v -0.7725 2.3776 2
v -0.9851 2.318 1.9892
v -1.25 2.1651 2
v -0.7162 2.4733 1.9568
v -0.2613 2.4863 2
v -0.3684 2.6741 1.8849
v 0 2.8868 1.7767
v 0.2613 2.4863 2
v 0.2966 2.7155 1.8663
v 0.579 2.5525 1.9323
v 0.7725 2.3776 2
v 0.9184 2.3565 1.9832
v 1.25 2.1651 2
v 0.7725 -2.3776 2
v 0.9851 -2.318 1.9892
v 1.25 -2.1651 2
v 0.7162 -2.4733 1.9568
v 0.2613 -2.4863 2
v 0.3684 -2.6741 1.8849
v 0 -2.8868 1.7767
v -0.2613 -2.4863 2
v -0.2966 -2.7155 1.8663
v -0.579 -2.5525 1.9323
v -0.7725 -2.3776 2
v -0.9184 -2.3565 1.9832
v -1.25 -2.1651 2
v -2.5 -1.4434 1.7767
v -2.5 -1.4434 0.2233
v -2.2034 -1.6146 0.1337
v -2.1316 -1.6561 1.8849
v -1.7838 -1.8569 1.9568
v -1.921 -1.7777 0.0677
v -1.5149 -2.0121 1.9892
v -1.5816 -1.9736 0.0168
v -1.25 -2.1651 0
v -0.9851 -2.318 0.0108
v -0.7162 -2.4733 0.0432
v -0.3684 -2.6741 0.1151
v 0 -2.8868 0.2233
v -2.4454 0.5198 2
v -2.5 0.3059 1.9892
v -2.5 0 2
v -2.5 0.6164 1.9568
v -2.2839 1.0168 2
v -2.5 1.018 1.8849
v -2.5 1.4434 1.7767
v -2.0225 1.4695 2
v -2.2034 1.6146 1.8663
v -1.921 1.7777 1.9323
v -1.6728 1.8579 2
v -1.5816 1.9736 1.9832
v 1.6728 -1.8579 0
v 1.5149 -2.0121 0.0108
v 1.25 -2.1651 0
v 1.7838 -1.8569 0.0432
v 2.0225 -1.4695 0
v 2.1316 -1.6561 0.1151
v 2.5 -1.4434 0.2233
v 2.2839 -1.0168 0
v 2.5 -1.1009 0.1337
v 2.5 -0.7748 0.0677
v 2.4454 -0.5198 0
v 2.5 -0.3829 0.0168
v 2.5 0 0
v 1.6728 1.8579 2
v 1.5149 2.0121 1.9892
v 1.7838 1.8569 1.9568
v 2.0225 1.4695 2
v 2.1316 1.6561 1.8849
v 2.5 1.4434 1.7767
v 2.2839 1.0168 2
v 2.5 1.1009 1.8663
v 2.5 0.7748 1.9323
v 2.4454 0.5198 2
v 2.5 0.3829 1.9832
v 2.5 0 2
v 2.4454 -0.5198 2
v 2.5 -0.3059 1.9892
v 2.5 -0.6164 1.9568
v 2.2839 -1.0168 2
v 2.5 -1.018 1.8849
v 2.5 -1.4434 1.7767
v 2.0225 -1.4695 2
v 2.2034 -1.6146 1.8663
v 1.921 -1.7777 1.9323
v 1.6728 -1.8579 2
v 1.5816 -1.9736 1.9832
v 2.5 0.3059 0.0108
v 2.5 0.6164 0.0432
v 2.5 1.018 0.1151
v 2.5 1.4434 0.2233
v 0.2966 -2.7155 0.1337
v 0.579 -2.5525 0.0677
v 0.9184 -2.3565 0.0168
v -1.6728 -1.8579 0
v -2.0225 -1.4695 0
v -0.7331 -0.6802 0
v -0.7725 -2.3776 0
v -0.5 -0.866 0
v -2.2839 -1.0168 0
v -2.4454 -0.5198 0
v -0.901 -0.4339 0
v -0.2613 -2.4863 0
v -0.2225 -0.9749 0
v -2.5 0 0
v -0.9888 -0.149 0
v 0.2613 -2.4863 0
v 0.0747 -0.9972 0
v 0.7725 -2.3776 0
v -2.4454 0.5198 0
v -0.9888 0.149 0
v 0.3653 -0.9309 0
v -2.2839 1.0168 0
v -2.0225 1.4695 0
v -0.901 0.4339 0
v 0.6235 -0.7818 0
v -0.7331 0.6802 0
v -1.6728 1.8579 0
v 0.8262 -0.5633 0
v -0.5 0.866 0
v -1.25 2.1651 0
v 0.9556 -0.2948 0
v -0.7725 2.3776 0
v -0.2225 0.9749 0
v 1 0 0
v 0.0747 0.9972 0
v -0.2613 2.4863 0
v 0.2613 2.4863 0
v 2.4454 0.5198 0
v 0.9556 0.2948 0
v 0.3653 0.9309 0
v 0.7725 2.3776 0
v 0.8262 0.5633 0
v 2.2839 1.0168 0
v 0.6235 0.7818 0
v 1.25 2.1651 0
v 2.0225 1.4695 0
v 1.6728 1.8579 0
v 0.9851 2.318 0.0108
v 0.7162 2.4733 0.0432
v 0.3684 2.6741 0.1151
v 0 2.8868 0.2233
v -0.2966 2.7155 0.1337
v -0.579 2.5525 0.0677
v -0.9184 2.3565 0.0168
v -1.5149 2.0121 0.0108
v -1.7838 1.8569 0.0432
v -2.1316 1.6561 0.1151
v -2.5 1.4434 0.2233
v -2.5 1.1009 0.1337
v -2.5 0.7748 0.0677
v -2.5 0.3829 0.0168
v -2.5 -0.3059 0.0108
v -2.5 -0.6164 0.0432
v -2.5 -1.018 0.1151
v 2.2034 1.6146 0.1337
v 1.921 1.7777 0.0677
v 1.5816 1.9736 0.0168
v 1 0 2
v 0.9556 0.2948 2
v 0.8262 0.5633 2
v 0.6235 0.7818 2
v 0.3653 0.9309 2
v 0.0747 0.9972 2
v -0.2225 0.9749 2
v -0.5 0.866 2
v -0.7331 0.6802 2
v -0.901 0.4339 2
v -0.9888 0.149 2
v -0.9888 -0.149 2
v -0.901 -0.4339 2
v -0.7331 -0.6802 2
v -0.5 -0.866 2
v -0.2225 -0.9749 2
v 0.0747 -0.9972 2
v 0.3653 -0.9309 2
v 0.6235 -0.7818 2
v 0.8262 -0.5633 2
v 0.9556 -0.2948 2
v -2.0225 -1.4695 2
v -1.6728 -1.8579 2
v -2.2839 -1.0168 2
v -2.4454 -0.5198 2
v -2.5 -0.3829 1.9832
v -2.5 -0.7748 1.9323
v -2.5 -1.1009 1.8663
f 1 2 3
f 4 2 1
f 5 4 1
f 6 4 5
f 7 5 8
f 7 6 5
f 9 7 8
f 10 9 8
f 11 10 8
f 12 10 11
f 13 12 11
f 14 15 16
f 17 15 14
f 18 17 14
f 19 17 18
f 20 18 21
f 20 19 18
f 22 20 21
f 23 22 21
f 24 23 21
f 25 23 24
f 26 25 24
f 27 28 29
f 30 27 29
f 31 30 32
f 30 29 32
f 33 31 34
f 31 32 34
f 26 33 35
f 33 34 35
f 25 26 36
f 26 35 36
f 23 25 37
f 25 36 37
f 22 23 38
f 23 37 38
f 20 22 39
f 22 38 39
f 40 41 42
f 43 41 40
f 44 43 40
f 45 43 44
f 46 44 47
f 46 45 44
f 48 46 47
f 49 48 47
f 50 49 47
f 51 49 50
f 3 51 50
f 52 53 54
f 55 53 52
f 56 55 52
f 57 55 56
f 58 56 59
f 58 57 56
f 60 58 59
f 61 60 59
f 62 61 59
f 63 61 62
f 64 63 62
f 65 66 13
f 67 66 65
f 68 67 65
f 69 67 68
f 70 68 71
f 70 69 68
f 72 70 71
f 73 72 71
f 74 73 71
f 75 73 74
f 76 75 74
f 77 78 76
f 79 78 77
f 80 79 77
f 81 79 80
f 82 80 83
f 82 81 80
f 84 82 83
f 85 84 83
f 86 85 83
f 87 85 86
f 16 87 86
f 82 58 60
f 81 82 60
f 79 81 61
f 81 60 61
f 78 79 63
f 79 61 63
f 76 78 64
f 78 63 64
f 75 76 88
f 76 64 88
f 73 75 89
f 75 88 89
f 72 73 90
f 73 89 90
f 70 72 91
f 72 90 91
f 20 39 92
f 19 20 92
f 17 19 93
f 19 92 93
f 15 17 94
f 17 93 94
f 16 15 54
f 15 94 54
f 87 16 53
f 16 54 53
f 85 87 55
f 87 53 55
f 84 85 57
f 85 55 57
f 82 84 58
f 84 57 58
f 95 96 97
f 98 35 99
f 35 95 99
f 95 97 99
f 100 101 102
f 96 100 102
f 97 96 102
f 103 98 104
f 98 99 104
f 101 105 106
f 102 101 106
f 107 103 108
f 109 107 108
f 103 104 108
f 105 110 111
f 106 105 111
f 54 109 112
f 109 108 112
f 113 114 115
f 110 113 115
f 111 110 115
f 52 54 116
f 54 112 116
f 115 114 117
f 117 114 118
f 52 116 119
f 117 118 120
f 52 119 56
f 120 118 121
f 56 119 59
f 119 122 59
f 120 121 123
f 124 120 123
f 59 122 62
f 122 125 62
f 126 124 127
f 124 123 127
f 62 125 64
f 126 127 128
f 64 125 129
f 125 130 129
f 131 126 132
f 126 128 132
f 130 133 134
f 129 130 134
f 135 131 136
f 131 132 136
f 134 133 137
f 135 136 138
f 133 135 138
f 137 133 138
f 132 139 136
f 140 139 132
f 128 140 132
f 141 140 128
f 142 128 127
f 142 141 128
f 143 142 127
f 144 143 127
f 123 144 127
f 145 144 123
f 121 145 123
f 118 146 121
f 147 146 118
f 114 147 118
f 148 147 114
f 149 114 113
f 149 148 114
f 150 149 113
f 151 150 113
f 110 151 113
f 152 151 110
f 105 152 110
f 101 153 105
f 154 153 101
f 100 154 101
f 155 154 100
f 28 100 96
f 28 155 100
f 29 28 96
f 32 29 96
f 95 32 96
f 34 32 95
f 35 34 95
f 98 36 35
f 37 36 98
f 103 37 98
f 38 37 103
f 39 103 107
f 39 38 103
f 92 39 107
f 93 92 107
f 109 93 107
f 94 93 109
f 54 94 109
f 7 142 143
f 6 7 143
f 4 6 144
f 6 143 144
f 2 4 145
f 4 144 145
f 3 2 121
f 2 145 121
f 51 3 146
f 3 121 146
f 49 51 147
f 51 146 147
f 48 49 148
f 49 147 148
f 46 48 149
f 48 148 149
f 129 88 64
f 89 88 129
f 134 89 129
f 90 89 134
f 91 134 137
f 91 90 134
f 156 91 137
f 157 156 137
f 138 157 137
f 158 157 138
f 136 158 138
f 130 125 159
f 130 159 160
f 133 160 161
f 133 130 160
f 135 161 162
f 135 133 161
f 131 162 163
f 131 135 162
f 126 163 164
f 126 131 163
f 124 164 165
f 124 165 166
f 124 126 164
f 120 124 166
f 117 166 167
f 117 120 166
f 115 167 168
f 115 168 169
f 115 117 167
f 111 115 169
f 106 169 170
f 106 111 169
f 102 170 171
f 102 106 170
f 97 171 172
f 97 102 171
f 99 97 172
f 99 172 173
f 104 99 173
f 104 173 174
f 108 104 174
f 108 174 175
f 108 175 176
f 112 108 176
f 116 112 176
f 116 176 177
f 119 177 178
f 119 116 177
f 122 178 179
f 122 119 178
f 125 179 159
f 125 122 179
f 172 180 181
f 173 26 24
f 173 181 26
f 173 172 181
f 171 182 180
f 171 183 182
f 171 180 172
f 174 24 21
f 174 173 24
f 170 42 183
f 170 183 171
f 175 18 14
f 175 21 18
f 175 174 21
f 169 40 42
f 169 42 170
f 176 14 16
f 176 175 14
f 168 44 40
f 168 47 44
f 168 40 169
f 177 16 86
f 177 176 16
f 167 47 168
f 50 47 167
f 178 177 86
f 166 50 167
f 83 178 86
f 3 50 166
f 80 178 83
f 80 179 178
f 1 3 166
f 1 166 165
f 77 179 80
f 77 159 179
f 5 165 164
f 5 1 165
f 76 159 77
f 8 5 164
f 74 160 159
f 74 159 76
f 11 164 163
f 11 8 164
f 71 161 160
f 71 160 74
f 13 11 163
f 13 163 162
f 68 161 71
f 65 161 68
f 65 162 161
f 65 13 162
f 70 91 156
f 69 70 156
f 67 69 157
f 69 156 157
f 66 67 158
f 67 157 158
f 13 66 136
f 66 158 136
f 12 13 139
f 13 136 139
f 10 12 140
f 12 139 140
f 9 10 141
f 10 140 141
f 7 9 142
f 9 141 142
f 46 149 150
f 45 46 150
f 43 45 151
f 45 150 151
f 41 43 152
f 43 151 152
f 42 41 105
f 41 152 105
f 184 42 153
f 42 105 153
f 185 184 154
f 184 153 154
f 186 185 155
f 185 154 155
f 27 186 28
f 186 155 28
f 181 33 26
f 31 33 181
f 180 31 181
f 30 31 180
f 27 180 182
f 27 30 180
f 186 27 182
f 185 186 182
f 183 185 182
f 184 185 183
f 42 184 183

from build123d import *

# Parameters (mm, degrees)
SKETCH1_R           = 1
BOSS_EXTRUDE1_DEPTH = 2
SKETCH2_OUTSIDE_W   = 15.508
SKETCH2_OUTSIDE_H   = 16.282
SKETCH2_OUTSIDE_R   = 2.5
CUT_EXTRUDE1_DEPTH  = 2
CUT_EXTRUDE1_TAPER  = 60
SKETCH3_OUTSIDE_W   = 15.508
SKETCH3_OUTSIDE_H   = 16.282
SKETCH3_OUTSIDE_R   = 2.5
CUT_EXTRUDE2_DEPTH  = 2
CUT_EXTRUDE2_TAPER  = 60


with BuildPart() as part:
    # Sketch1 → Boss-Extrude1 (new body)
    with BuildSketch(Plane.XY):
        Polygon((0, -2.886751346), (2.5, -1.443375673), (2.5, 1.443375673), (0, 2.886751346), (-2.5, 1.443375673), (-2.5, -1.443375673), align=None)
        Circle(SKETCH1_R, mode=Mode.SUBTRACT)
    extrude(amount=BOSS_EXTRUDE1_DEPTH)

    # Sketch2 outside → Cut-Extrude1 (cut)
    with BuildSketch(Plane.XY.offset(2)):
        Rectangle(SKETCH2_OUTSIDE_W, SKETCH2_OUTSIDE_H)
        Circle(SKETCH2_OUTSIDE_R, mode=Mode.SUBTRACT)
    extrude(amount=-CUT_EXTRUDE1_DEPTH, taper=CUT_EXTRUDE1_TAPER, mode=Mode.SUBTRACT)

    # Sketch3 outside → Cut-Extrude2 (cut)
    with BuildSketch(Plane(origin=(0, 0, 0), x_dir=(-1, 0, 0), z_dir=(0, 0, -1))):
        Rectangle(SKETCH3_OUTSIDE_W, SKETCH3_OUTSIDE_H)
        Circle(SKETCH3_OUTSIDE_R, mode=Mode.SUBTRACT)
    extrude(amount=-CUT_EXTRUDE2_DEPTH, taper=CUT_EXTRUDE2_TAPER, mode=Mode.SUBTRACT)


solid = part.part
